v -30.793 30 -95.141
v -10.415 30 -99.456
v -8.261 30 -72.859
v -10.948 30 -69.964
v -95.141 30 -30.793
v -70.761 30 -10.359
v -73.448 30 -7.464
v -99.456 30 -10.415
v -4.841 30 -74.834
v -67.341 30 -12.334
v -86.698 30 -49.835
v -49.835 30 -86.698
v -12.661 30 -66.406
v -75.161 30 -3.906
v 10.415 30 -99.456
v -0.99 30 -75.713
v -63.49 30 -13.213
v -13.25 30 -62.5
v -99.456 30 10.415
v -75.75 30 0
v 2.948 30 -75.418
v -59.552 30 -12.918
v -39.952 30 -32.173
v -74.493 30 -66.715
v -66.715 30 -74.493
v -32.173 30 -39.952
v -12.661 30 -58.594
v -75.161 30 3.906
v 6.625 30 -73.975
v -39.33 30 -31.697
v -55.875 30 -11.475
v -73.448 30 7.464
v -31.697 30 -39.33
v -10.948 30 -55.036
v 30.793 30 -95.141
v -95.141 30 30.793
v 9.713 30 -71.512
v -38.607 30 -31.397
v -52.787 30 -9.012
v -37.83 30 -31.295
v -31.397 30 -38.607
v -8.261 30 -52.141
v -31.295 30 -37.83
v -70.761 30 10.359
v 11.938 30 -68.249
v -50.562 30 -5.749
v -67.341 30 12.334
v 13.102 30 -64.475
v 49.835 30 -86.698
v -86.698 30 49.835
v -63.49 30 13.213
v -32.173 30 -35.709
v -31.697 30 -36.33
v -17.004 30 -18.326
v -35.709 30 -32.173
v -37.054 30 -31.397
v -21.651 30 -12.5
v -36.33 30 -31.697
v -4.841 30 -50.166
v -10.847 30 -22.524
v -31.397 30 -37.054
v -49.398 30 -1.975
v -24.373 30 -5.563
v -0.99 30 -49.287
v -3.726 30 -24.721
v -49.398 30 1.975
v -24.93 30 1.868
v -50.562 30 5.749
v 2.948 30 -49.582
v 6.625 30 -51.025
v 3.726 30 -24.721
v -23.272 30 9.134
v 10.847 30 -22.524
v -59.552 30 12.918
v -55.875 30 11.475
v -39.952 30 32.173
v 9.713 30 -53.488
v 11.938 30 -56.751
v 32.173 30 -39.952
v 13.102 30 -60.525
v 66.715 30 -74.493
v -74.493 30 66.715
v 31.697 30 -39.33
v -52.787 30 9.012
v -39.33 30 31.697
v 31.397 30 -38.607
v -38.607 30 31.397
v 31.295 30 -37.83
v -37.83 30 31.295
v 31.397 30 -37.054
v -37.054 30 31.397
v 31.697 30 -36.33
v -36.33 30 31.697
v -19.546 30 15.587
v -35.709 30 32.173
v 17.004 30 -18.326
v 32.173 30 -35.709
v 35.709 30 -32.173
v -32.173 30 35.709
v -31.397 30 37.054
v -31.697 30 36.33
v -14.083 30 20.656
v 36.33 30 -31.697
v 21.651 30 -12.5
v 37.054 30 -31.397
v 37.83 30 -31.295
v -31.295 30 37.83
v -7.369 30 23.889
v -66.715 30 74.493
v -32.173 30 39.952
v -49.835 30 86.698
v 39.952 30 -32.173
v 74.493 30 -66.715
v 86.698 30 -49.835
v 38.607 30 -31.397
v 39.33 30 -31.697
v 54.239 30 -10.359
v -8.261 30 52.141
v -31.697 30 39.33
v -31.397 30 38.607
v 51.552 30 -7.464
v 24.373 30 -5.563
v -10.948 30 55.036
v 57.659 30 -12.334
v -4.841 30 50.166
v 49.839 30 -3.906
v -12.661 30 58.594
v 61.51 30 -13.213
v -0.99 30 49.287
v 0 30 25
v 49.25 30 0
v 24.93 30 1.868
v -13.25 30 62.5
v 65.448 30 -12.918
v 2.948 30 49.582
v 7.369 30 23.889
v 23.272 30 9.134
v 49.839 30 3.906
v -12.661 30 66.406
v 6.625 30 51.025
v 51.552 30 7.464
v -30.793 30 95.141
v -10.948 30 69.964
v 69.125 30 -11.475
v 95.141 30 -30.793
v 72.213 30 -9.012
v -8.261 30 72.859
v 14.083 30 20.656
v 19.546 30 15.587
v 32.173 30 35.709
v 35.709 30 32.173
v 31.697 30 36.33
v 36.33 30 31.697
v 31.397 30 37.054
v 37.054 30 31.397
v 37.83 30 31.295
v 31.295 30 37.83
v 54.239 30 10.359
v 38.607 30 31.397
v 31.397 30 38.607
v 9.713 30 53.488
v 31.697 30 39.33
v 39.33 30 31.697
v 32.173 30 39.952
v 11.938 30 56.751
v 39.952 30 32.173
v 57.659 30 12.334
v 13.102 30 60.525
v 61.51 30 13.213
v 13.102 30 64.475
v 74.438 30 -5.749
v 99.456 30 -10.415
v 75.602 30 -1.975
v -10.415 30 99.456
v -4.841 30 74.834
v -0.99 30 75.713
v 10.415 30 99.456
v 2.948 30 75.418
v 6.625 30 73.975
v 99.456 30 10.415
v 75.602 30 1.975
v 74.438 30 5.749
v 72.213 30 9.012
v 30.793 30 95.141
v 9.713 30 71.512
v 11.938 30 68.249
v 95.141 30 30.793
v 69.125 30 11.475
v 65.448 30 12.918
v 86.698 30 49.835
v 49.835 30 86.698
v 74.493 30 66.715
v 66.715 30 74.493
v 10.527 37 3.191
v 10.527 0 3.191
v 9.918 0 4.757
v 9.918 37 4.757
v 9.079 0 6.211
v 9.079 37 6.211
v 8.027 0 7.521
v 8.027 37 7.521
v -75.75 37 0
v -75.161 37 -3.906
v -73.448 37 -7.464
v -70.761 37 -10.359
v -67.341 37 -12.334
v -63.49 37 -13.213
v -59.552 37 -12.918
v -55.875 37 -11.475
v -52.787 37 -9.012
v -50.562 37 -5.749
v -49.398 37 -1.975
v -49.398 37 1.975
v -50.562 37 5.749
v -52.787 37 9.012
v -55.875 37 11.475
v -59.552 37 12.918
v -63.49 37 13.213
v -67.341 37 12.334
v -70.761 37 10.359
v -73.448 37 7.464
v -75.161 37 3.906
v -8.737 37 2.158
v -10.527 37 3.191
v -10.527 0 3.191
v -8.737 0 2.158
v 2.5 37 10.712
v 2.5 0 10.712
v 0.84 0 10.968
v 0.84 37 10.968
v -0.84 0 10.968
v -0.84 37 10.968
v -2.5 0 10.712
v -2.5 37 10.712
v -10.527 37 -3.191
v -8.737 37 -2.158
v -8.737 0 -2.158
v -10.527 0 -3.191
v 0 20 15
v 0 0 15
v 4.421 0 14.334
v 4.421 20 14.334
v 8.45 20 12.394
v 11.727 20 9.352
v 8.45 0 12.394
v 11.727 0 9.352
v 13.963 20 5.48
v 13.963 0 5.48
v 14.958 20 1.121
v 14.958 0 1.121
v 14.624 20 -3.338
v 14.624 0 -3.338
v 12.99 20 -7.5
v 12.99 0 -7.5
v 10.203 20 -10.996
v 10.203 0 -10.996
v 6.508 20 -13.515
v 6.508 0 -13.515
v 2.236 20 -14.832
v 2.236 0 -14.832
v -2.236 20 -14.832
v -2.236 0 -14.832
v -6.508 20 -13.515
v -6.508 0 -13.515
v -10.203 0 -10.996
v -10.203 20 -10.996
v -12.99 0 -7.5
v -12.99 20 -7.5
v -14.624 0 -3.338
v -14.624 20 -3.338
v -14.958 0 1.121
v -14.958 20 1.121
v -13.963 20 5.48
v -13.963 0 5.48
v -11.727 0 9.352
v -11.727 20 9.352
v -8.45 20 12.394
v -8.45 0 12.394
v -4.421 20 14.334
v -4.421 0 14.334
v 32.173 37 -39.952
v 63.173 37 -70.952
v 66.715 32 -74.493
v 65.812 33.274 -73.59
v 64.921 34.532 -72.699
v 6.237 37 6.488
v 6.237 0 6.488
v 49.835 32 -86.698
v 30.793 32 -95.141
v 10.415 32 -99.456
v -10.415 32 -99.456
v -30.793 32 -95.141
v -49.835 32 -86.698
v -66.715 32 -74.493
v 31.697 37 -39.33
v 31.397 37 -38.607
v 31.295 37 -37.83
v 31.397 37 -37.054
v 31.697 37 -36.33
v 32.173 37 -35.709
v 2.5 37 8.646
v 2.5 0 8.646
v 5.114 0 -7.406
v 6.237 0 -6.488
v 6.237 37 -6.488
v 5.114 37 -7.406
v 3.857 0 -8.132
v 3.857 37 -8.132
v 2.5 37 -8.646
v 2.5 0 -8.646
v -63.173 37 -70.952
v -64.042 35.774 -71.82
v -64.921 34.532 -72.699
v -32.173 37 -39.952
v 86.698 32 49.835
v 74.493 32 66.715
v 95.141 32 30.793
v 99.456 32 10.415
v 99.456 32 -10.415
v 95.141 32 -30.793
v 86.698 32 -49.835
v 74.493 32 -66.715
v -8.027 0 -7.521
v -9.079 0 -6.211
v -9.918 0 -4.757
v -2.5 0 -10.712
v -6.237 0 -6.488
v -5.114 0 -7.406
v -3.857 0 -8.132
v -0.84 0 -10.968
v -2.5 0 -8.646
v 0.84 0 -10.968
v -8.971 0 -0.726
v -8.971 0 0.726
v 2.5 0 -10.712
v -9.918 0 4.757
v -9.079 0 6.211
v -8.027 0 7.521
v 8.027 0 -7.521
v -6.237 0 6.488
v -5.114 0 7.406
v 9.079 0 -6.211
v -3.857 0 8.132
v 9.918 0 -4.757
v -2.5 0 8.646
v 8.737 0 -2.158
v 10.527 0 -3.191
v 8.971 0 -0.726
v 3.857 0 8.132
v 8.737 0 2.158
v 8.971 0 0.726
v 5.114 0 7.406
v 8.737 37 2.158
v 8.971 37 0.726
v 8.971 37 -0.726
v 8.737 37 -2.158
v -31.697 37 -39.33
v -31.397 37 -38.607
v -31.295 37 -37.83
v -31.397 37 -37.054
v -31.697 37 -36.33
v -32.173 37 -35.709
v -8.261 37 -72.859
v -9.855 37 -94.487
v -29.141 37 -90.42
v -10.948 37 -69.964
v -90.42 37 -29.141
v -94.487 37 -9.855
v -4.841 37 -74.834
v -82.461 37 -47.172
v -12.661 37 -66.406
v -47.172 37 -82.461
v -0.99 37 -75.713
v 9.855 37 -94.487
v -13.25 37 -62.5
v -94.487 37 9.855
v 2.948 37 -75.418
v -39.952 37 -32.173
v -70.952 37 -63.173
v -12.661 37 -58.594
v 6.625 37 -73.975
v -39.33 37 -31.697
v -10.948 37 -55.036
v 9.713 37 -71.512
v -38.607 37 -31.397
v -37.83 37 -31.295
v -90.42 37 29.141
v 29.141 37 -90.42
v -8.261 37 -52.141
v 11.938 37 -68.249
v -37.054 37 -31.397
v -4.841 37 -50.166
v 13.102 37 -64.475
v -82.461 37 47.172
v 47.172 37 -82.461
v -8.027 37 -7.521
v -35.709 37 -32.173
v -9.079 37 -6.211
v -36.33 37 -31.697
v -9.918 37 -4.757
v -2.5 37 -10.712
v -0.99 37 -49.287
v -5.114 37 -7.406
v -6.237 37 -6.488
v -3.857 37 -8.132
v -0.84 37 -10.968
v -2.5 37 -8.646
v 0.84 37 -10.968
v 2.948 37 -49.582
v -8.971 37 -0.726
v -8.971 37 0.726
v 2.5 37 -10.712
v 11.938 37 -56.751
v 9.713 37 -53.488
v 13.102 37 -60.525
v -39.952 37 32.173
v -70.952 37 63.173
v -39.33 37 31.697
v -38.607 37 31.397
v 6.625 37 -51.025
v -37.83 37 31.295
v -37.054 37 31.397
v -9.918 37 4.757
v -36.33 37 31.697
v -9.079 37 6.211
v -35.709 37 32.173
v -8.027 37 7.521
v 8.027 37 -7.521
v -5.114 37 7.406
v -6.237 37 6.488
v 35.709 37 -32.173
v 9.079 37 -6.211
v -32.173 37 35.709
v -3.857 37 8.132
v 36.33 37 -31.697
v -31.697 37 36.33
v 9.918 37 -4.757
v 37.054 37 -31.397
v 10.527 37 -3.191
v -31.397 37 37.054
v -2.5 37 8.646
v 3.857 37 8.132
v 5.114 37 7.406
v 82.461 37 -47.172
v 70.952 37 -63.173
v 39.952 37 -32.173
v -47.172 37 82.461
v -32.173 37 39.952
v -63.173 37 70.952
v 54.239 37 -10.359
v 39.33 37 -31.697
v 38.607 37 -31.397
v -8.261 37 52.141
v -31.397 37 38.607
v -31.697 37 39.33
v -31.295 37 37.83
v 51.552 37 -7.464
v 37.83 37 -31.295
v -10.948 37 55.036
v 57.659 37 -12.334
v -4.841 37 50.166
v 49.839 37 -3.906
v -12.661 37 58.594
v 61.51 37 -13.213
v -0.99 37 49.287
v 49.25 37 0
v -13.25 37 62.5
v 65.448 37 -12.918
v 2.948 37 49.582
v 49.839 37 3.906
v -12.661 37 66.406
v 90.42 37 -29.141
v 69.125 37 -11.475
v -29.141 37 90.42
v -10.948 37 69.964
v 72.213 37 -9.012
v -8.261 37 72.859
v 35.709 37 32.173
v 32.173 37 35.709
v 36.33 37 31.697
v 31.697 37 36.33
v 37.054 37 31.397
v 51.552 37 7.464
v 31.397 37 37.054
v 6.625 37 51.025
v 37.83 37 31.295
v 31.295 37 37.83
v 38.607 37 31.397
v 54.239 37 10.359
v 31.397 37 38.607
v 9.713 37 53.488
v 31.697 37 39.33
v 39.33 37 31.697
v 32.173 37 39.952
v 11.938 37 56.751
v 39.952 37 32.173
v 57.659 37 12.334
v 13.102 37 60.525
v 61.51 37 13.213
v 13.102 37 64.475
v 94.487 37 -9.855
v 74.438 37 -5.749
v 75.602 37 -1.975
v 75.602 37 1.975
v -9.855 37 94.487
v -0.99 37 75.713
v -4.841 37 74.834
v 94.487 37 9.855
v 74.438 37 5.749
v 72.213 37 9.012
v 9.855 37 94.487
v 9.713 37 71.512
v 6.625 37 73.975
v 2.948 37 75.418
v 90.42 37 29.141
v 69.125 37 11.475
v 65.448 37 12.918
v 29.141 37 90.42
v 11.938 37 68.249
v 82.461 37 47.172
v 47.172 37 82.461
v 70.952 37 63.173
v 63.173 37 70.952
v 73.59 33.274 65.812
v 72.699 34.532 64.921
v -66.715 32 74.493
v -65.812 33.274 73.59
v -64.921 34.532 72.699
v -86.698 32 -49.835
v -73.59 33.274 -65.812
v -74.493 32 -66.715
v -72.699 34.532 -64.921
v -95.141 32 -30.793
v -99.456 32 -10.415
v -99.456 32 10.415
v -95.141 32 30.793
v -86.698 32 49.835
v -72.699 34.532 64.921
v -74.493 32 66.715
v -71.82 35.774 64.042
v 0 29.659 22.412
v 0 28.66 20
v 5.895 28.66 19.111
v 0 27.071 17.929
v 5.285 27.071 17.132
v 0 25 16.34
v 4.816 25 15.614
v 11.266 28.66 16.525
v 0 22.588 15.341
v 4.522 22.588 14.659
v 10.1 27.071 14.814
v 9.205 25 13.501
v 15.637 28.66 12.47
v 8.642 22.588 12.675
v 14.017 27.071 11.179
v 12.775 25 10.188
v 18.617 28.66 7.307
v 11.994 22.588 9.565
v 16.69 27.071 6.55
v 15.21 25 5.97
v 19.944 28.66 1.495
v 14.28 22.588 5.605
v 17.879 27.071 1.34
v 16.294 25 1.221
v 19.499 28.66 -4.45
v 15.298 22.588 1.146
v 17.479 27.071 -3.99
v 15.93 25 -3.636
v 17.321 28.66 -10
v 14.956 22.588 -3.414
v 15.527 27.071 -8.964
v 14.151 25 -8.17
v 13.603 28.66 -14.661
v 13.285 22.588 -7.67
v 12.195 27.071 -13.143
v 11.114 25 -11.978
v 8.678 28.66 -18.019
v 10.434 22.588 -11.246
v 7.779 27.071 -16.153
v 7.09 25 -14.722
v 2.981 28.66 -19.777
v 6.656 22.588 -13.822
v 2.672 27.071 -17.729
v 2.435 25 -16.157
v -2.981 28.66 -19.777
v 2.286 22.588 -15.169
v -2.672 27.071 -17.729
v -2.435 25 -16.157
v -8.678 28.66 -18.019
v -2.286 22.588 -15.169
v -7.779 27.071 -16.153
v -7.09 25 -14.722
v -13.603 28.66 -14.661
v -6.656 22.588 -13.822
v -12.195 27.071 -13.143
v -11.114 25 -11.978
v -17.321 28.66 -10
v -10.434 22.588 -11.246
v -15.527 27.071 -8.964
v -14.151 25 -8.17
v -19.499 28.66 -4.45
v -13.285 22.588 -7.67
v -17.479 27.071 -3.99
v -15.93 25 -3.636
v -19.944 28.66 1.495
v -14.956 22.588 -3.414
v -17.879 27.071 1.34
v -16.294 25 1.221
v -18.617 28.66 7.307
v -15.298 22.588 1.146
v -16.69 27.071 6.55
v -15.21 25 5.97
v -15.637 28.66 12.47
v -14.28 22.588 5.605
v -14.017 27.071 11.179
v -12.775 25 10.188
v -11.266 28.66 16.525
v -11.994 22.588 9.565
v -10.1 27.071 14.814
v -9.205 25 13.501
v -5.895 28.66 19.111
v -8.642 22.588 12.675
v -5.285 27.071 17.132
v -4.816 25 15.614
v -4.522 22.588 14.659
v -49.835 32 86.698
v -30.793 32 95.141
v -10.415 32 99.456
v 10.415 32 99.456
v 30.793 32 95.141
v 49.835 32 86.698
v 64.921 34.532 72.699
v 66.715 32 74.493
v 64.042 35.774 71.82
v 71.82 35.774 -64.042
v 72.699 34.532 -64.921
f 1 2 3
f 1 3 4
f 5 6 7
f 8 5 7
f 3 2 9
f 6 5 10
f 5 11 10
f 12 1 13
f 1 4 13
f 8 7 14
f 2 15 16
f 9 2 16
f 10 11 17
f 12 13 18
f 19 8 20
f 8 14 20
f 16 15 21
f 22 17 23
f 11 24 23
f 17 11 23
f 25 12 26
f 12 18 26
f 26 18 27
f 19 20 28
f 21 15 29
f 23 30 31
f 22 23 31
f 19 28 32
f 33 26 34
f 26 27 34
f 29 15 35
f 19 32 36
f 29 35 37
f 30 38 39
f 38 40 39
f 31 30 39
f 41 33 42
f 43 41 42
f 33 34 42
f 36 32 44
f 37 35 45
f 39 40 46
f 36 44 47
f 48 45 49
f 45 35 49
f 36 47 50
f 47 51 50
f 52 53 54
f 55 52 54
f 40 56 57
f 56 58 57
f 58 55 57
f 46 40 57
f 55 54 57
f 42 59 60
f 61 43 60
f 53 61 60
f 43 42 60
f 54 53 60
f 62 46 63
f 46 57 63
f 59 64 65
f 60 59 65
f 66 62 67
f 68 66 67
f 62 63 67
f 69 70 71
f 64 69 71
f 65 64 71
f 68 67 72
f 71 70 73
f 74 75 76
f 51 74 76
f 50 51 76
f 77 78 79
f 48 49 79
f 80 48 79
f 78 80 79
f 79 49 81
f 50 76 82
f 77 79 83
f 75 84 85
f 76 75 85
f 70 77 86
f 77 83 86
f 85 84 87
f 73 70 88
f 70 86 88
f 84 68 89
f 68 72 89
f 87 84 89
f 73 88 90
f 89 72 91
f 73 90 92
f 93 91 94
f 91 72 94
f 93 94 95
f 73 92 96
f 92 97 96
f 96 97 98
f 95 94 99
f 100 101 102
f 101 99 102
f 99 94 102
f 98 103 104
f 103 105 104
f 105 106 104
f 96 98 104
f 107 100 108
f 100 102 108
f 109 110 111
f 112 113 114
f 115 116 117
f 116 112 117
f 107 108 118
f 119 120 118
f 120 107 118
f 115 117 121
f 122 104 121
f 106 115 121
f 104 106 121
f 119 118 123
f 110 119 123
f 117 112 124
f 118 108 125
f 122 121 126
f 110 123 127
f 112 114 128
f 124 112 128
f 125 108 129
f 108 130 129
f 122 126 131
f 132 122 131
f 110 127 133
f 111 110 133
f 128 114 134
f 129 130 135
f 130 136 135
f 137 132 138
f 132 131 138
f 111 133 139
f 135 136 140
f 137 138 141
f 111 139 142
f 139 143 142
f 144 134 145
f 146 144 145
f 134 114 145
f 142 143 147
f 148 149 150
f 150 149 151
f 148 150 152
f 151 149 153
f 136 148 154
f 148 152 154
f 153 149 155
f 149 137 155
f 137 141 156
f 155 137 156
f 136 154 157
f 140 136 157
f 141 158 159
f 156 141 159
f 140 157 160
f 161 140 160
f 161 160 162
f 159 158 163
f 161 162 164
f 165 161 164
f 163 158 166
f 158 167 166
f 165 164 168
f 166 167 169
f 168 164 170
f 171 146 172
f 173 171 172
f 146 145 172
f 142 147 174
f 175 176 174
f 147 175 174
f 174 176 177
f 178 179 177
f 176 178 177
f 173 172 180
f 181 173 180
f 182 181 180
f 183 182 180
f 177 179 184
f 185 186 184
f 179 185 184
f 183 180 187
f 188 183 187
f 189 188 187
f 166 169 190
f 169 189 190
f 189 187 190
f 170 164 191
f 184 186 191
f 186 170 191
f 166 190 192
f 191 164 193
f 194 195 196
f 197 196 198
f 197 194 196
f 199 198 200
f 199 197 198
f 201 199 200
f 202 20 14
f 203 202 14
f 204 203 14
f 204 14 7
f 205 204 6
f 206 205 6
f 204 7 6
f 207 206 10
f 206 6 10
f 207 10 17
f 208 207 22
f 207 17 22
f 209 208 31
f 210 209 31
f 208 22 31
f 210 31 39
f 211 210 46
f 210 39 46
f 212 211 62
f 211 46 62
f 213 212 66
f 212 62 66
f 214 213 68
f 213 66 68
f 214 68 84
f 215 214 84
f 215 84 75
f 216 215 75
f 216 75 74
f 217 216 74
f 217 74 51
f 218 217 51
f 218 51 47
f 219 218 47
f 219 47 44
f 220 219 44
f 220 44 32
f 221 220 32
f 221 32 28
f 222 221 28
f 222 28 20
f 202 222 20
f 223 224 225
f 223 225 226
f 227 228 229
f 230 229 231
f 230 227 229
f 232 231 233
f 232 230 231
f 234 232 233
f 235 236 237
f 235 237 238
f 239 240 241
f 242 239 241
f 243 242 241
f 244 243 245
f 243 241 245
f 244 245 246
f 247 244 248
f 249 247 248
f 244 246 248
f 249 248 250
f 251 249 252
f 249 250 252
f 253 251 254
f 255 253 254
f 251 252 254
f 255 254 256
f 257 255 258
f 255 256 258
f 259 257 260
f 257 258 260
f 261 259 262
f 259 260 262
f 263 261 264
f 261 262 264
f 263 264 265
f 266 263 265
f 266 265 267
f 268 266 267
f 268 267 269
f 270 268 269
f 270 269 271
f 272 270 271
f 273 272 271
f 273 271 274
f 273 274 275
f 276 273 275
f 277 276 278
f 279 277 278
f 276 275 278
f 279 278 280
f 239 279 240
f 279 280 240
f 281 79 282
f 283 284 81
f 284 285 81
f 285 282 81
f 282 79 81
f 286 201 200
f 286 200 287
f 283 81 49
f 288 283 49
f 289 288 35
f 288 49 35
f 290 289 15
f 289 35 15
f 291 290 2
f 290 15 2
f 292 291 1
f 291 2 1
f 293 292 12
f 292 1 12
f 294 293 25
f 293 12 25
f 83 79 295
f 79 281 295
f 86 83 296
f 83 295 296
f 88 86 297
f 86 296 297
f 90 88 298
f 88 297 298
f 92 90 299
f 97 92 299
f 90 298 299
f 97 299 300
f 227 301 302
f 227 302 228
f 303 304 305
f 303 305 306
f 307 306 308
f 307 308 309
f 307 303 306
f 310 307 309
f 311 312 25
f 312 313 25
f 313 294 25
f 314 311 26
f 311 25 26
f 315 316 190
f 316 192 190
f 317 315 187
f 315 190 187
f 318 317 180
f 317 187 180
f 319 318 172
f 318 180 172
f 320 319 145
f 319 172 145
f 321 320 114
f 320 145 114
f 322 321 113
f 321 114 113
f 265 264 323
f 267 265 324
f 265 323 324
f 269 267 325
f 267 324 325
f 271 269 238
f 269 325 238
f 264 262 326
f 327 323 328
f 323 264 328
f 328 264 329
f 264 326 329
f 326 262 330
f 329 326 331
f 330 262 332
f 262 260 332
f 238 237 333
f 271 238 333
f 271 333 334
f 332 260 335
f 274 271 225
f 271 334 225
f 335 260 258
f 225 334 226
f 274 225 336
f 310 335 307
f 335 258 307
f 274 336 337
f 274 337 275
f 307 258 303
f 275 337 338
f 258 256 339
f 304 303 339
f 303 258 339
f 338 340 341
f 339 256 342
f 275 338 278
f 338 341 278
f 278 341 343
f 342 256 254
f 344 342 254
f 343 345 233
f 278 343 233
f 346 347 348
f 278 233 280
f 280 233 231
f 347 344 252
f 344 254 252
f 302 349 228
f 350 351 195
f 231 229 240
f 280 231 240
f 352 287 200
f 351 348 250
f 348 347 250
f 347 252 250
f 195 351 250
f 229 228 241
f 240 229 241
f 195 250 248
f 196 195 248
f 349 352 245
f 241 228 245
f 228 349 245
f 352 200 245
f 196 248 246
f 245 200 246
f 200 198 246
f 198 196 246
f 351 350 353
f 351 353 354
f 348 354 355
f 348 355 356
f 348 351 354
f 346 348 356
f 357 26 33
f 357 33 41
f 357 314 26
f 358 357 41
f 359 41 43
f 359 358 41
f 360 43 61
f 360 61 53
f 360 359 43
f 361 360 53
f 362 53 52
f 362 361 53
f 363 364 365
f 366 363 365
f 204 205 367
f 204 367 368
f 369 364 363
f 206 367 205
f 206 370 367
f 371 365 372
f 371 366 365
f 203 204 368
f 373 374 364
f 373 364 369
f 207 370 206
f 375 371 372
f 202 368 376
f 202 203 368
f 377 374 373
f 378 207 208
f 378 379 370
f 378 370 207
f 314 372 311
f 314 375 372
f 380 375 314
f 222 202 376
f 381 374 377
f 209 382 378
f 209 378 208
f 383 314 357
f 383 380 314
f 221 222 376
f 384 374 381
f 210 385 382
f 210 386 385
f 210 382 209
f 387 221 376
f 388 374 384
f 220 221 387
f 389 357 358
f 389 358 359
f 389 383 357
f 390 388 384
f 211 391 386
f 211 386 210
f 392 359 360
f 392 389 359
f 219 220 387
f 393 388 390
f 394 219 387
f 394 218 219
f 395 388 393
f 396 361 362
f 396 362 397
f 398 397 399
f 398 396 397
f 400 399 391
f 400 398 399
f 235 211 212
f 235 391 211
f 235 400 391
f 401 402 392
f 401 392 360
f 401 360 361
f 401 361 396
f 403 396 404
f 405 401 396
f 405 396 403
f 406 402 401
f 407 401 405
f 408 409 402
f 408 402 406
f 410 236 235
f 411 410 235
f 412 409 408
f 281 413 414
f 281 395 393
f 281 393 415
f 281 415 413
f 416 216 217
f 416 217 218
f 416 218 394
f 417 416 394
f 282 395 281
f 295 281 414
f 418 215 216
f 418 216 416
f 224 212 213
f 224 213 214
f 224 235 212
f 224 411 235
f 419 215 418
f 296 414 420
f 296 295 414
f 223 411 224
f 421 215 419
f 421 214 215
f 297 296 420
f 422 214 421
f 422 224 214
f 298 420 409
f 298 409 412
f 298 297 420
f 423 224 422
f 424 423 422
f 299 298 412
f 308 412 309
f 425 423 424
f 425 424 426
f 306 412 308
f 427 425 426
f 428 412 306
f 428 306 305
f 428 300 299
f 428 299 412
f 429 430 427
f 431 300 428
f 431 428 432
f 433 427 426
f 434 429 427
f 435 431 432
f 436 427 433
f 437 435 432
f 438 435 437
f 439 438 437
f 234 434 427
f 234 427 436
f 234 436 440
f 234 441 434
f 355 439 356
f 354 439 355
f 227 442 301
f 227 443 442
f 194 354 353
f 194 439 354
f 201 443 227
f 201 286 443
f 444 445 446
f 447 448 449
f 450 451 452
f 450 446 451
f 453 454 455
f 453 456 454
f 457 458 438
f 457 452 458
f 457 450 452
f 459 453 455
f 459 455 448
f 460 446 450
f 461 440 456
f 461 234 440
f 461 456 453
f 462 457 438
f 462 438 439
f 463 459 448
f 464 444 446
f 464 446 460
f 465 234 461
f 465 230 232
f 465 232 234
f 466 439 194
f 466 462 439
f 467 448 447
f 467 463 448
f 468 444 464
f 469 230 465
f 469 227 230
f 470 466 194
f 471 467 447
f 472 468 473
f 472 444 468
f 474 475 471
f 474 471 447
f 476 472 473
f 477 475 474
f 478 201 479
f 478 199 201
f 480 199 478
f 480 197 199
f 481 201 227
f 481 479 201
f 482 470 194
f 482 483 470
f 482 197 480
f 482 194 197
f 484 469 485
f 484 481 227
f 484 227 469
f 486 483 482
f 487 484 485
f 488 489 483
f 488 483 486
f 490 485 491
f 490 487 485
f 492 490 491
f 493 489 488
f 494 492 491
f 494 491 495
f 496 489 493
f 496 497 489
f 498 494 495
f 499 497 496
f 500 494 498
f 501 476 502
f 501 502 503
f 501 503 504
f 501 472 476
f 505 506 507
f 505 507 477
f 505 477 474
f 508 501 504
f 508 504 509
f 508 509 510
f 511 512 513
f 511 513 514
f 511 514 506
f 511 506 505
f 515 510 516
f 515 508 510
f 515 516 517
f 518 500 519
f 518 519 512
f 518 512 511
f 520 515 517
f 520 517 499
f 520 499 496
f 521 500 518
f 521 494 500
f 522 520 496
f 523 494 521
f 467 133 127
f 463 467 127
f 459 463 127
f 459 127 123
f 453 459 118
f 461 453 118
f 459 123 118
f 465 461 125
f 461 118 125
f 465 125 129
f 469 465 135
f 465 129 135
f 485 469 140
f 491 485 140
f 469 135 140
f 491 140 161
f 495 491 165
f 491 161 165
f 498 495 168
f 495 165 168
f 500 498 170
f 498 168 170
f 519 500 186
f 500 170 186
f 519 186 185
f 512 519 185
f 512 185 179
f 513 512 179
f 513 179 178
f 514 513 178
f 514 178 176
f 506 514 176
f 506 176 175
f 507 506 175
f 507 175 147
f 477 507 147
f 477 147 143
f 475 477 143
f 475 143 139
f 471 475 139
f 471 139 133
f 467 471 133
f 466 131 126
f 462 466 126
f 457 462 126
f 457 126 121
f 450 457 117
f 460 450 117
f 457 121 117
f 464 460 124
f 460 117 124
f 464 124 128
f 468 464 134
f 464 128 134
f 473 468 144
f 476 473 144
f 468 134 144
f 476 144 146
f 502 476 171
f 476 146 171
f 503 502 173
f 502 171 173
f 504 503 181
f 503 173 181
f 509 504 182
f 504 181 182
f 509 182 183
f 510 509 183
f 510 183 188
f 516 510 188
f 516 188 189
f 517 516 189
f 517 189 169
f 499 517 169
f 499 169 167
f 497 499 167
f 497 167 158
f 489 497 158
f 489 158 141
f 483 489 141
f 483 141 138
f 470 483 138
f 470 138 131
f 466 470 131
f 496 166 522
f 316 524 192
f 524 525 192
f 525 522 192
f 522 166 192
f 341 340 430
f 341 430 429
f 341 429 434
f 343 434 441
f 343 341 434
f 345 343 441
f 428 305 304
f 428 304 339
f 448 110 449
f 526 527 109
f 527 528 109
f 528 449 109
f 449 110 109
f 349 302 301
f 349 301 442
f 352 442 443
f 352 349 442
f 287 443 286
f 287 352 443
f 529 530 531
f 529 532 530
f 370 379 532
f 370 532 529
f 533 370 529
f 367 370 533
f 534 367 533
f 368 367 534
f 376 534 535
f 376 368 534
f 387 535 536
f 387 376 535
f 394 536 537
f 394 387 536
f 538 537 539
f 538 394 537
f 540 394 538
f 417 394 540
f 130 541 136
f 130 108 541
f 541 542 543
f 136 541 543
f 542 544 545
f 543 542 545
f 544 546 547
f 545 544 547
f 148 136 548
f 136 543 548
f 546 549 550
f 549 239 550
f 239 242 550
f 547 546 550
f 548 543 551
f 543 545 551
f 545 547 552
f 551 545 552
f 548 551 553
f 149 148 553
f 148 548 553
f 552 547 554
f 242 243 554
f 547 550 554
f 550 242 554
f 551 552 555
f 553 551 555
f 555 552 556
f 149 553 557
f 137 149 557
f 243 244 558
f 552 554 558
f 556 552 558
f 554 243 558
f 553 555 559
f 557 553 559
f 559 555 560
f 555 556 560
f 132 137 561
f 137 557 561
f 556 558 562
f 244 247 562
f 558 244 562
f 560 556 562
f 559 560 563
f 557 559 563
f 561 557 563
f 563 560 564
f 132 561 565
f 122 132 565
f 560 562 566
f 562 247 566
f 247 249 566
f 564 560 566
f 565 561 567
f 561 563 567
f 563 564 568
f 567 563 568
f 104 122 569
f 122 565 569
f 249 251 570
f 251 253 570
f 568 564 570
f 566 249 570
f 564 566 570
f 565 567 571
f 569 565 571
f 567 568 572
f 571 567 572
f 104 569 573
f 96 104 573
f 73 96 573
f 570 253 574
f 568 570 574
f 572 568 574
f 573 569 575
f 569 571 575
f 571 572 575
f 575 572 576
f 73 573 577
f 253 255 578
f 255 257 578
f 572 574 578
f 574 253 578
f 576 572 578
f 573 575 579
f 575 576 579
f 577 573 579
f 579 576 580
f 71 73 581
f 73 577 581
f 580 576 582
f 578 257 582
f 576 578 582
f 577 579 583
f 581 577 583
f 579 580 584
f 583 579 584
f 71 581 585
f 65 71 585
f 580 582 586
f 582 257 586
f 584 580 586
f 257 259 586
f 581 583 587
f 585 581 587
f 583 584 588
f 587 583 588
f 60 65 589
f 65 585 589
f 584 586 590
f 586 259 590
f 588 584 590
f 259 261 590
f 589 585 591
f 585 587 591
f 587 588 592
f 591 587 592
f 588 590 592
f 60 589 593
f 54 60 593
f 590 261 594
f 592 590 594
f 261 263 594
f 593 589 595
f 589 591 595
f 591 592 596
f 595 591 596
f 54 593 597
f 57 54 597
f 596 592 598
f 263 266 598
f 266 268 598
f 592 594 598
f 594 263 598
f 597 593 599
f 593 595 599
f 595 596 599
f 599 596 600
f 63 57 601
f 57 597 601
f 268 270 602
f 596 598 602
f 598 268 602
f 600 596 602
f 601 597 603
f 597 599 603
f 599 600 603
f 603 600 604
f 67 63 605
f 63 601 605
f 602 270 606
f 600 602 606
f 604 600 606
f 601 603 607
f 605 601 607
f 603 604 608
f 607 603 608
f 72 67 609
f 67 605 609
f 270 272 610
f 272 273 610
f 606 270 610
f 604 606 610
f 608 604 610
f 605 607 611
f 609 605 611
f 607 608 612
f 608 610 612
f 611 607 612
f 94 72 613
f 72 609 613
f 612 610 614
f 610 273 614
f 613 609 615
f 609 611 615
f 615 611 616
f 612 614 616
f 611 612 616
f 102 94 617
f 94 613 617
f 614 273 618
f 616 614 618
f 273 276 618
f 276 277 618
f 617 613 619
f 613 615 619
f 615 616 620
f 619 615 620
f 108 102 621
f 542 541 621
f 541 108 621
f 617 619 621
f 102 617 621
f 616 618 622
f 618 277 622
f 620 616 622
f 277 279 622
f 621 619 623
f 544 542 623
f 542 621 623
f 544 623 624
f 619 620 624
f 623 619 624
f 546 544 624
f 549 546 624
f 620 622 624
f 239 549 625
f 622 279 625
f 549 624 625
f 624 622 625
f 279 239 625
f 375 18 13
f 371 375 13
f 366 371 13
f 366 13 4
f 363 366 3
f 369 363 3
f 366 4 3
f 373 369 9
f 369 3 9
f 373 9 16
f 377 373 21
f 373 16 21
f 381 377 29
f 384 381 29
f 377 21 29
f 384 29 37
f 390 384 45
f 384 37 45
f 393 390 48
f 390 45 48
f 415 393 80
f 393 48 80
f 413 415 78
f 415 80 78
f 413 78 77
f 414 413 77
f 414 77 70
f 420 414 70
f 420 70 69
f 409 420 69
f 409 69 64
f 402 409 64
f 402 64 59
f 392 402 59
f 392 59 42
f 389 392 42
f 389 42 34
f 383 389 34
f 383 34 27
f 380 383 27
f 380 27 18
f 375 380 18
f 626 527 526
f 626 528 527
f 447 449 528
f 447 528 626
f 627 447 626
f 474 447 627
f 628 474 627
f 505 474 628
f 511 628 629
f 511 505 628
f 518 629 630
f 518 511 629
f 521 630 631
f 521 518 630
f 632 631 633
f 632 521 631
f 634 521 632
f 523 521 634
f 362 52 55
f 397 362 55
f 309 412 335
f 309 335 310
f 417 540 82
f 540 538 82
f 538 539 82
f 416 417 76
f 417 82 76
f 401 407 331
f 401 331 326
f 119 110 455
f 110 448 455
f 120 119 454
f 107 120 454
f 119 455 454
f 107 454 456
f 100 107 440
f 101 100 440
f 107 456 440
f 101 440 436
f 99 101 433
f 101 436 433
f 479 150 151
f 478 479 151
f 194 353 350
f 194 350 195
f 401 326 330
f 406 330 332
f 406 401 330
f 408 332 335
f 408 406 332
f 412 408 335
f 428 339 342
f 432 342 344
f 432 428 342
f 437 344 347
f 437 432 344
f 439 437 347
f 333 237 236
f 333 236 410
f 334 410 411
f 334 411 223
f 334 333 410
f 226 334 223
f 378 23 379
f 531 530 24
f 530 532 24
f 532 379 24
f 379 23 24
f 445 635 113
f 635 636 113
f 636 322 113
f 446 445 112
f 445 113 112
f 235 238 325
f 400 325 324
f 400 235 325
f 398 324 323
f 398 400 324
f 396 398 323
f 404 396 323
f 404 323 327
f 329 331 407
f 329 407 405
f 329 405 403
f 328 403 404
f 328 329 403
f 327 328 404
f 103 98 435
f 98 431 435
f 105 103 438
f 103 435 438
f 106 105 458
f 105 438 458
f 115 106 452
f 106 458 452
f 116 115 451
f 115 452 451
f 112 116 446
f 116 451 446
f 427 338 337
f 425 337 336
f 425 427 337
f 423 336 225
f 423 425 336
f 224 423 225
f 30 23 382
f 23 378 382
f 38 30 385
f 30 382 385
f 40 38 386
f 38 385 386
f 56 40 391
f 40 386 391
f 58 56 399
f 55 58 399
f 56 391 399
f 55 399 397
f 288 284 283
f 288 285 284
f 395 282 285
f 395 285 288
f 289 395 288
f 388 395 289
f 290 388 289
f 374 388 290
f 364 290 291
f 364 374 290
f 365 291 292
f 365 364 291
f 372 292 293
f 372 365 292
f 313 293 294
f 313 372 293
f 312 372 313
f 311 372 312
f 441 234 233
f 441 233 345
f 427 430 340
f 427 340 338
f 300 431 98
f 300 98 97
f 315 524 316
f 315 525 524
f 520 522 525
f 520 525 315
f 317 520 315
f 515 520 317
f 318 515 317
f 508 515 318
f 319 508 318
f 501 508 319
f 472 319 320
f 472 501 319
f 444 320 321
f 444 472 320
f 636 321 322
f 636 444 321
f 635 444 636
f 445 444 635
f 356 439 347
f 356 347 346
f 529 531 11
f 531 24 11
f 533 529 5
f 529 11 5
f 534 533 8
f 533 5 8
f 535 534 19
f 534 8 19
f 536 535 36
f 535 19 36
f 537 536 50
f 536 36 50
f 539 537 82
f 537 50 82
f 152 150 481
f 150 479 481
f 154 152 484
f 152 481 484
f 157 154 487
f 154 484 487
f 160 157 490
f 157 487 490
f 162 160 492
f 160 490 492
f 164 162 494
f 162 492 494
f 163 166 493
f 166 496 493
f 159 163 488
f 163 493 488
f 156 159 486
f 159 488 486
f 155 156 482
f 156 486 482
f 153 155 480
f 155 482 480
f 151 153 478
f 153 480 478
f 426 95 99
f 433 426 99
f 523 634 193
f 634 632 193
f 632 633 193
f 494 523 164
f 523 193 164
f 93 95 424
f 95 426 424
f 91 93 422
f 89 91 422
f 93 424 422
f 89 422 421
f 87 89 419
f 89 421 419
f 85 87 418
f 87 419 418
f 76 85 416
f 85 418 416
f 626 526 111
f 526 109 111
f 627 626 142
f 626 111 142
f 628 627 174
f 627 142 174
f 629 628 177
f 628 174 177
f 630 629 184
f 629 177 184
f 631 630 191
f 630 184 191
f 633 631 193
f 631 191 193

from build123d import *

# Parameters (mm, degrees)
SKETCH_1_R               = 15
SKETCH_1_R_2             = 9
EXTRUDE_1_DEPTH          = 30
SKETCH_2_R               = 100
SKETCH_2_R_2             = 15
SKETCH_2_R_3             = 9
EXTRUDE_2_DEPTH          = 7
CUT_EXTRUDE_1_DEPTH      = 147.181394165
PATTERN_CIRCULAR_1_COUNT = 6
FILLET_1_R               = 10
HOLE_WIZARD_M30_1_D      = 26.5
HOLE_WIZARD_M30_1_DEPTH  = 62.538596798
HOLE_WIZARD_M30_1_TIP    = 7.961403202
CHAMFER_1_SIZE           = 5
CUT_EXTRUDE_1_2_DEPTH    = 145.568322948
PATTERN_CIRCULAR_2_COUNT = 4
FILLET_2_R               = 3


with BuildPart() as part:
    # 草图1 → 凸台-拉伸1 (new body)
    with BuildSketch(Plane(origin=(0, 0, 0), x_dir=(1, 0, 0), z_dir=(0, 1, 0))):
        with Locations(Location((0, 0, 0), (0, 0, 270))):
            Circle(SKETCH_1_R)
        with Locations(Location((0, 0, 0), (0, 0, 270))):
            Circle(SKETCH_1_R_2, mode=Mode.SUBTRACT)
    extrude(amount=EXTRUDE_1_DEPTH)

    # 草图2 → 凸台-拉伸2 (add)
    # profile 1 of 2: a face of its own
    with BuildSketch(Plane(origin=(0, 30, 0), x_dir=(1, 0, 0), z_dir=(0, 1, 0))):
        with Locations(Location((0, 0, 0), (0, 0, 270))):
            Circle(SKETCH_2_R)
        with Locations(Location((0, 0, 0), (0, 0, 270))):
            Circle(SKETCH_2_R_2, mode=Mode.SUBTRACT)
    # profile 2 of 2: a face of its own
    with BuildSketch(Plane(origin=(0, 30, 0), x_dir=(1, 0, 0), z_dir=(0, 1, 0))):
        with Locations(Location((0, 0, 0), (0, 0, 270))):
            Circle(SKETCH_2_R_2)
        with Locations(Location((0, 0, 0), (0, 0, 270))):
            Circle(SKETCH_2_R_3, mode=Mode.SUBTRACT)
    extrude(amount=EXTRUDE_2_DEPTH)

    # 草图7 → Cut-Extrude 1 (cut, through all)
    with BuildSketch(Plane(origin=(0, 37, 0), x_dir=(1, 0, 0), z_dir=(0, 1, 0))):
        with BuildLine():
            Line((-2.5, -10.712142643), (-2.5, 10.712142643))
            ThreePointArc((-2.5, 10.712142643), (0, 11), (2.5, 10.712142643))
            Line((2.5, 10.712142643), (2.5, -10.712142643))
            ThreePointArc((2.5, -10.712142643), (0, -11), (-2.5, -10.712142643))
        make_face()
    cut_extrude_1 = extrude(amount=-CUT_EXTRUDE_1_DEPTH, mode=Mode.SUBTRACT)

    # 阵列(圆周)1: Cut-Extrude 1 ×6 about axis
    pattern_circular_1_axis = Axis((0, 0, 0), (0, 1, 0))
    for i in range(1, PATTERN_CIRCULAR_1_COUNT):
        add(cut_extrude_1.rotate(pattern_circular_1_axis, i * 360 / PATTERN_CIRCULAR_1_COUNT), mode=Mode.SUBTRACT)

    # 圆角1
    fillet_1_edges = [part.edges().sort_by_distance(p)[0] for p in [
        (0, 30, -15),
    ]]
    fillet(fillet_1_edges, radius=FILLET_1_R)

    # M30 螺纹孔1
    with Locations(Plane(origin=(0, 37, 0), x_dir=(1, 0, 0), z_dir=(0, 1, 0))):
        with Locations((0, 62.5), (62.5, 0), (0, -62.5), (-62.5, 0)):
            Hole(HOLE_WIZARD_M30_1_D / 2, depth=HOLE_WIZARD_M30_1_DEPTH)
            with Locations((0, 0, -(HOLE_WIZARD_M30_1_DEPTH + HOLE_WIZARD_M30_1_TIP / 2))):  # 118° drill point
                Cone(0, HOLE_WIZARD_M30_1_D / 2, HOLE_WIZARD_M30_1_TIP, mode=Mode.SUBTRACT)

    # 倒角1
    chamfer_1_edges = [part.edges().sort_by_distance(p)[0] for p in [
        (0, 37, -100),
    ]]
    chamfer(chamfer_1_edges, length=CHAMFER_1_SIZE)

    # 草图10 → Cut-Extrude 1 2 (cut, symmetric)
    with BuildSketch(Plane.XZ.offset(-30)):
        Polygon((30.0520382, -37.830212793), (66.821590822, -74.599765415), (74.599765415, -66.821590822), (37.830212793, -30.0520382), align=None)
    cut_extrude_1_2 = extrude(amount=CUT_EXTRUDE_1_2_DEPTH, both=True, mode=Mode.SUBTRACT)

    # 阵列(圆周)2: Cut-Extrude 1 2 ×4 about axis
    pattern_circular_2_axis = Axis((0, 0, 0), (0, 1, 0))
    for i in range(1, PATTERN_CIRCULAR_2_COUNT):
        add(cut_extrude_1_2.rotate(pattern_circular_2_axis, i * 360 / PATTERN_CIRCULAR_2_COUNT), mode=Mode.SUBTRACT)

    # 圆角2
    fillet_2_edges = [part.edges().sort_by_distance(p)[0] for p in [
        (30.0520382, 33.5, -37.830212793),
        (37.830212793, 33.5, -30.0520382),
        (37.830212793, 33.5, 30.0520382),
        (30.0520382, 33.5, 37.830212793),
        (-30.0520382, 33.5, 37.830212793),
        (-37.830212793, 33.5, 30.0520382),
        (-37.830212793, 33.5, -30.0520382),
        (-30.0520382, 33.5, -37.830212793),
    ]]
    fillet(fillet_2_edges, radius=FILLET_2_R)


solid = part.part
